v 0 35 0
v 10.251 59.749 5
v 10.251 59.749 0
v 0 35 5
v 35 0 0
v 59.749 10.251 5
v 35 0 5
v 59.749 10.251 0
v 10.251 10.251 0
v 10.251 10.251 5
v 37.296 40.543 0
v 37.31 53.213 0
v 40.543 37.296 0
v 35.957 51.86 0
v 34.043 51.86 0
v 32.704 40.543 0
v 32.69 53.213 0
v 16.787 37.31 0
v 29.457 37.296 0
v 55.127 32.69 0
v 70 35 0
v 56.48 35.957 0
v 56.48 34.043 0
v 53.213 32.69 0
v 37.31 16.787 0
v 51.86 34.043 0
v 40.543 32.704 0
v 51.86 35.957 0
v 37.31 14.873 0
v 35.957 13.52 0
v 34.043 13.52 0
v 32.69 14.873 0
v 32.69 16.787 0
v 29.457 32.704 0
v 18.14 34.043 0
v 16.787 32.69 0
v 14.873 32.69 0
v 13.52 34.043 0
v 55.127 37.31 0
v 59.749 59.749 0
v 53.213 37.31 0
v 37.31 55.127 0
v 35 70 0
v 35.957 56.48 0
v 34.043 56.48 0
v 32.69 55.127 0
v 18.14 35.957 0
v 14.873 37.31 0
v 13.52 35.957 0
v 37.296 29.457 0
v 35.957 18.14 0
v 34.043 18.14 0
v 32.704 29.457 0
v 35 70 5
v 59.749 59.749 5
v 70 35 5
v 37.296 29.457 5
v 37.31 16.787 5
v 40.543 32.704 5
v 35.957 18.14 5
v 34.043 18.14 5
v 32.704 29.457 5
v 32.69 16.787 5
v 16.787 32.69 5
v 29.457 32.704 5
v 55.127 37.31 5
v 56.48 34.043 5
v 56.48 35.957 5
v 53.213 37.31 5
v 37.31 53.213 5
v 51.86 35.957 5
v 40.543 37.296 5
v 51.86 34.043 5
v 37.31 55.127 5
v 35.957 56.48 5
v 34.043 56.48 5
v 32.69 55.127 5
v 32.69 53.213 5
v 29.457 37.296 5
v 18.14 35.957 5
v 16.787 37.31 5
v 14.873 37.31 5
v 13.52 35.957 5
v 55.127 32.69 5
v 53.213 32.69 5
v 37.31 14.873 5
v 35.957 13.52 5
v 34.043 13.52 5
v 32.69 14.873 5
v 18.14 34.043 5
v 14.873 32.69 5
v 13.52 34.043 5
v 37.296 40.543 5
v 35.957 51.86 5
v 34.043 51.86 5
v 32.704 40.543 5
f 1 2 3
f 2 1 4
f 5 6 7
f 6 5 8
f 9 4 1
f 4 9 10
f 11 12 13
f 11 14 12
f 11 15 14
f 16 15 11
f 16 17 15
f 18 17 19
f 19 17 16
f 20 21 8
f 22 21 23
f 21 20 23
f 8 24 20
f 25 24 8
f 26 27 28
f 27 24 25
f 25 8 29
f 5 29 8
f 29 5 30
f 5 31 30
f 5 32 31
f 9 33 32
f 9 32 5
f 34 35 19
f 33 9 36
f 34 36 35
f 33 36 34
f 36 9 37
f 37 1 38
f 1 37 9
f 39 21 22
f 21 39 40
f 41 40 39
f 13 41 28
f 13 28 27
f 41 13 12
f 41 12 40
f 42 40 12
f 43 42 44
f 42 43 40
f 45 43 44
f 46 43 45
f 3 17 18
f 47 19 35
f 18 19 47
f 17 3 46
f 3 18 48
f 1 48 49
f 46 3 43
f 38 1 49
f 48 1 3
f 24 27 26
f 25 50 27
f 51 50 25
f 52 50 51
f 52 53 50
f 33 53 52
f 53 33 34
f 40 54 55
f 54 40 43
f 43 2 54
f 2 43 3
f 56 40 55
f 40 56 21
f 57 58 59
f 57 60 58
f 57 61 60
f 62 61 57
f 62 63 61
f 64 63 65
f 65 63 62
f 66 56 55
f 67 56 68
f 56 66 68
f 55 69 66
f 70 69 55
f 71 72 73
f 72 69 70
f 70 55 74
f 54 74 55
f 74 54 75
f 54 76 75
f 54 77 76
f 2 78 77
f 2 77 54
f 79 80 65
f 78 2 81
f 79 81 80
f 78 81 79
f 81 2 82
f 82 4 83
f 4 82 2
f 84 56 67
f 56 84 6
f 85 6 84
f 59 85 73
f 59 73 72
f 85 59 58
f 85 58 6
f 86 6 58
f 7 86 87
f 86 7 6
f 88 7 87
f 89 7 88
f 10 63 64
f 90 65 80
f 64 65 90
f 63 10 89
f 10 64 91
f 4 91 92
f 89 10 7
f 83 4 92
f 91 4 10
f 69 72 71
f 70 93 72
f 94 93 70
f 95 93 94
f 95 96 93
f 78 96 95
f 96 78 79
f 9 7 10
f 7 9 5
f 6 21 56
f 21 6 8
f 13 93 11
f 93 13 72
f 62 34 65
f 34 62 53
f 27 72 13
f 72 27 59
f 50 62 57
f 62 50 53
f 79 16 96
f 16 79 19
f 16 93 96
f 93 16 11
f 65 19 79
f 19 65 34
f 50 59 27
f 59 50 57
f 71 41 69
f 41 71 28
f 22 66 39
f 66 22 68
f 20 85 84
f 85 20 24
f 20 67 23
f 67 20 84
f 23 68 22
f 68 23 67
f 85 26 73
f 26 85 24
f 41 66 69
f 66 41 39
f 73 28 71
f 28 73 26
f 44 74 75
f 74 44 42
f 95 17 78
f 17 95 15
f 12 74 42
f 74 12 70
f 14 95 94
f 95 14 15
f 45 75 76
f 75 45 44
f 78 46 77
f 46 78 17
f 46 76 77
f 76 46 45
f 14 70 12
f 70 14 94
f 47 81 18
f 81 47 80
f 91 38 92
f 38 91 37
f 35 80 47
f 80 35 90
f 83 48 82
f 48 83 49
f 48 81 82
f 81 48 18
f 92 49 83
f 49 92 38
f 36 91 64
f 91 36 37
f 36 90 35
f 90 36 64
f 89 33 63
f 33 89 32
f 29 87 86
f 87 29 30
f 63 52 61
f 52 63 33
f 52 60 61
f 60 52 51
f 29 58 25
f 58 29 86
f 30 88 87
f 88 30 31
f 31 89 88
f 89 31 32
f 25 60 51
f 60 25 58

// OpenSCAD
$fn = 32;

// ----------------------------------------------------------------------
// Polygon plate: 8-gon R35, 4 bolt windows
// ----------------------------------------------------------------------

// --- parameters (mm) ---
sides = 8;                // number of polygon sides
plate_r = 35;             // circumscribed radius of the polygon
bore_r = 6;               // centre bore radius
bolts = 4;                // number of bolt windows
ring_r = 19.17;           // bolt-circle radius
bolt_r = 2.5;             // bolt window radius
plate_t = 5;              // plate thickness, Z (extrusion height)
fit_tol = 0.05;           // declared fit tolerance (prompt contract)
free_tol = 0.2;           // declared free tolerance (prompt contract)

plate_d = 2 * plate_r;  // circumscribed diameter
bore_d = 2 * bore_r;  // centre bore diameter
bolt_d = 2 * bolt_r;  // bolt window diameter
ring_d = 2 * ring_r;  // bolt-circle diameter

profile = [[70, 35], [59.749, 59.749], [35, 70], [10.251, 59.749], [0, 35], [10.251, 10.251], [35, 0], [59.749, 10.251]];  // primary outline, 8 points, counter clockwise
void_1 = [[40.543, 37.296], [37.296, 40.543], [32.704, 40.543], [29.457, 37.296], [29.457, 32.704], [32.704, 29.457], [37.296, 29.457], [40.543, 32.704]];  // centre bore, 8 points
void_2 = [[56.48, 35.957], [55.127, 37.31], [53.213, 37.31], [51.86, 35.957], [51.86, 34.043], [53.213, 32.69], [55.127, 32.69], [56.48, 34.043]];  // bolt window 1, 8 points
void_3 = [[37.31, 55.127], [35.957, 56.48], [34.043, 56.48], [32.69, 55.127], [32.69, 53.213], [34.043, 51.86], [35.957, 51.86], [37.31, 53.213]];  // bolt window 2, 8 points
void_4 = [[18.14, 35.957], [16.787, 37.31], [14.873, 37.31], [13.52, 35.957], [13.52, 34.043], [14.873, 32.69], [16.787, 32.69], [18.14, 34.043]];  // bolt window 3, 8 points
void_5 = [[37.31, 16.787], [35.957, 18.14], [34.043, 18.14], [32.69, 16.787], [32.69, 14.873], [34.043, 13.52], [35.957, 13.52], [37.31, 14.873]];  // bolt window 4, 8 points

// --- the one profile operation ---
difference() {
  linear_extrude(height = plate_t) polygon(points = profile);
  translate([0, 0, -1])
    linear_extrude(height = plate_t + 2) polygon(points = void_1);
  translate([0, 0, -1])
    linear_extrude(height = plate_t + 2) polygon(points = void_2);
  translate([0, 0, -1])
    linear_extrude(height = plate_t + 2) polygon(points = void_3);
  translate([0, 0, -1])
    linear_extrude(height = plate_t + 2) polygon(points = void_4);
  translate([0, 0, -1])
    linear_extrude(height = plate_t + 2) polygon(points = void_5);
}
